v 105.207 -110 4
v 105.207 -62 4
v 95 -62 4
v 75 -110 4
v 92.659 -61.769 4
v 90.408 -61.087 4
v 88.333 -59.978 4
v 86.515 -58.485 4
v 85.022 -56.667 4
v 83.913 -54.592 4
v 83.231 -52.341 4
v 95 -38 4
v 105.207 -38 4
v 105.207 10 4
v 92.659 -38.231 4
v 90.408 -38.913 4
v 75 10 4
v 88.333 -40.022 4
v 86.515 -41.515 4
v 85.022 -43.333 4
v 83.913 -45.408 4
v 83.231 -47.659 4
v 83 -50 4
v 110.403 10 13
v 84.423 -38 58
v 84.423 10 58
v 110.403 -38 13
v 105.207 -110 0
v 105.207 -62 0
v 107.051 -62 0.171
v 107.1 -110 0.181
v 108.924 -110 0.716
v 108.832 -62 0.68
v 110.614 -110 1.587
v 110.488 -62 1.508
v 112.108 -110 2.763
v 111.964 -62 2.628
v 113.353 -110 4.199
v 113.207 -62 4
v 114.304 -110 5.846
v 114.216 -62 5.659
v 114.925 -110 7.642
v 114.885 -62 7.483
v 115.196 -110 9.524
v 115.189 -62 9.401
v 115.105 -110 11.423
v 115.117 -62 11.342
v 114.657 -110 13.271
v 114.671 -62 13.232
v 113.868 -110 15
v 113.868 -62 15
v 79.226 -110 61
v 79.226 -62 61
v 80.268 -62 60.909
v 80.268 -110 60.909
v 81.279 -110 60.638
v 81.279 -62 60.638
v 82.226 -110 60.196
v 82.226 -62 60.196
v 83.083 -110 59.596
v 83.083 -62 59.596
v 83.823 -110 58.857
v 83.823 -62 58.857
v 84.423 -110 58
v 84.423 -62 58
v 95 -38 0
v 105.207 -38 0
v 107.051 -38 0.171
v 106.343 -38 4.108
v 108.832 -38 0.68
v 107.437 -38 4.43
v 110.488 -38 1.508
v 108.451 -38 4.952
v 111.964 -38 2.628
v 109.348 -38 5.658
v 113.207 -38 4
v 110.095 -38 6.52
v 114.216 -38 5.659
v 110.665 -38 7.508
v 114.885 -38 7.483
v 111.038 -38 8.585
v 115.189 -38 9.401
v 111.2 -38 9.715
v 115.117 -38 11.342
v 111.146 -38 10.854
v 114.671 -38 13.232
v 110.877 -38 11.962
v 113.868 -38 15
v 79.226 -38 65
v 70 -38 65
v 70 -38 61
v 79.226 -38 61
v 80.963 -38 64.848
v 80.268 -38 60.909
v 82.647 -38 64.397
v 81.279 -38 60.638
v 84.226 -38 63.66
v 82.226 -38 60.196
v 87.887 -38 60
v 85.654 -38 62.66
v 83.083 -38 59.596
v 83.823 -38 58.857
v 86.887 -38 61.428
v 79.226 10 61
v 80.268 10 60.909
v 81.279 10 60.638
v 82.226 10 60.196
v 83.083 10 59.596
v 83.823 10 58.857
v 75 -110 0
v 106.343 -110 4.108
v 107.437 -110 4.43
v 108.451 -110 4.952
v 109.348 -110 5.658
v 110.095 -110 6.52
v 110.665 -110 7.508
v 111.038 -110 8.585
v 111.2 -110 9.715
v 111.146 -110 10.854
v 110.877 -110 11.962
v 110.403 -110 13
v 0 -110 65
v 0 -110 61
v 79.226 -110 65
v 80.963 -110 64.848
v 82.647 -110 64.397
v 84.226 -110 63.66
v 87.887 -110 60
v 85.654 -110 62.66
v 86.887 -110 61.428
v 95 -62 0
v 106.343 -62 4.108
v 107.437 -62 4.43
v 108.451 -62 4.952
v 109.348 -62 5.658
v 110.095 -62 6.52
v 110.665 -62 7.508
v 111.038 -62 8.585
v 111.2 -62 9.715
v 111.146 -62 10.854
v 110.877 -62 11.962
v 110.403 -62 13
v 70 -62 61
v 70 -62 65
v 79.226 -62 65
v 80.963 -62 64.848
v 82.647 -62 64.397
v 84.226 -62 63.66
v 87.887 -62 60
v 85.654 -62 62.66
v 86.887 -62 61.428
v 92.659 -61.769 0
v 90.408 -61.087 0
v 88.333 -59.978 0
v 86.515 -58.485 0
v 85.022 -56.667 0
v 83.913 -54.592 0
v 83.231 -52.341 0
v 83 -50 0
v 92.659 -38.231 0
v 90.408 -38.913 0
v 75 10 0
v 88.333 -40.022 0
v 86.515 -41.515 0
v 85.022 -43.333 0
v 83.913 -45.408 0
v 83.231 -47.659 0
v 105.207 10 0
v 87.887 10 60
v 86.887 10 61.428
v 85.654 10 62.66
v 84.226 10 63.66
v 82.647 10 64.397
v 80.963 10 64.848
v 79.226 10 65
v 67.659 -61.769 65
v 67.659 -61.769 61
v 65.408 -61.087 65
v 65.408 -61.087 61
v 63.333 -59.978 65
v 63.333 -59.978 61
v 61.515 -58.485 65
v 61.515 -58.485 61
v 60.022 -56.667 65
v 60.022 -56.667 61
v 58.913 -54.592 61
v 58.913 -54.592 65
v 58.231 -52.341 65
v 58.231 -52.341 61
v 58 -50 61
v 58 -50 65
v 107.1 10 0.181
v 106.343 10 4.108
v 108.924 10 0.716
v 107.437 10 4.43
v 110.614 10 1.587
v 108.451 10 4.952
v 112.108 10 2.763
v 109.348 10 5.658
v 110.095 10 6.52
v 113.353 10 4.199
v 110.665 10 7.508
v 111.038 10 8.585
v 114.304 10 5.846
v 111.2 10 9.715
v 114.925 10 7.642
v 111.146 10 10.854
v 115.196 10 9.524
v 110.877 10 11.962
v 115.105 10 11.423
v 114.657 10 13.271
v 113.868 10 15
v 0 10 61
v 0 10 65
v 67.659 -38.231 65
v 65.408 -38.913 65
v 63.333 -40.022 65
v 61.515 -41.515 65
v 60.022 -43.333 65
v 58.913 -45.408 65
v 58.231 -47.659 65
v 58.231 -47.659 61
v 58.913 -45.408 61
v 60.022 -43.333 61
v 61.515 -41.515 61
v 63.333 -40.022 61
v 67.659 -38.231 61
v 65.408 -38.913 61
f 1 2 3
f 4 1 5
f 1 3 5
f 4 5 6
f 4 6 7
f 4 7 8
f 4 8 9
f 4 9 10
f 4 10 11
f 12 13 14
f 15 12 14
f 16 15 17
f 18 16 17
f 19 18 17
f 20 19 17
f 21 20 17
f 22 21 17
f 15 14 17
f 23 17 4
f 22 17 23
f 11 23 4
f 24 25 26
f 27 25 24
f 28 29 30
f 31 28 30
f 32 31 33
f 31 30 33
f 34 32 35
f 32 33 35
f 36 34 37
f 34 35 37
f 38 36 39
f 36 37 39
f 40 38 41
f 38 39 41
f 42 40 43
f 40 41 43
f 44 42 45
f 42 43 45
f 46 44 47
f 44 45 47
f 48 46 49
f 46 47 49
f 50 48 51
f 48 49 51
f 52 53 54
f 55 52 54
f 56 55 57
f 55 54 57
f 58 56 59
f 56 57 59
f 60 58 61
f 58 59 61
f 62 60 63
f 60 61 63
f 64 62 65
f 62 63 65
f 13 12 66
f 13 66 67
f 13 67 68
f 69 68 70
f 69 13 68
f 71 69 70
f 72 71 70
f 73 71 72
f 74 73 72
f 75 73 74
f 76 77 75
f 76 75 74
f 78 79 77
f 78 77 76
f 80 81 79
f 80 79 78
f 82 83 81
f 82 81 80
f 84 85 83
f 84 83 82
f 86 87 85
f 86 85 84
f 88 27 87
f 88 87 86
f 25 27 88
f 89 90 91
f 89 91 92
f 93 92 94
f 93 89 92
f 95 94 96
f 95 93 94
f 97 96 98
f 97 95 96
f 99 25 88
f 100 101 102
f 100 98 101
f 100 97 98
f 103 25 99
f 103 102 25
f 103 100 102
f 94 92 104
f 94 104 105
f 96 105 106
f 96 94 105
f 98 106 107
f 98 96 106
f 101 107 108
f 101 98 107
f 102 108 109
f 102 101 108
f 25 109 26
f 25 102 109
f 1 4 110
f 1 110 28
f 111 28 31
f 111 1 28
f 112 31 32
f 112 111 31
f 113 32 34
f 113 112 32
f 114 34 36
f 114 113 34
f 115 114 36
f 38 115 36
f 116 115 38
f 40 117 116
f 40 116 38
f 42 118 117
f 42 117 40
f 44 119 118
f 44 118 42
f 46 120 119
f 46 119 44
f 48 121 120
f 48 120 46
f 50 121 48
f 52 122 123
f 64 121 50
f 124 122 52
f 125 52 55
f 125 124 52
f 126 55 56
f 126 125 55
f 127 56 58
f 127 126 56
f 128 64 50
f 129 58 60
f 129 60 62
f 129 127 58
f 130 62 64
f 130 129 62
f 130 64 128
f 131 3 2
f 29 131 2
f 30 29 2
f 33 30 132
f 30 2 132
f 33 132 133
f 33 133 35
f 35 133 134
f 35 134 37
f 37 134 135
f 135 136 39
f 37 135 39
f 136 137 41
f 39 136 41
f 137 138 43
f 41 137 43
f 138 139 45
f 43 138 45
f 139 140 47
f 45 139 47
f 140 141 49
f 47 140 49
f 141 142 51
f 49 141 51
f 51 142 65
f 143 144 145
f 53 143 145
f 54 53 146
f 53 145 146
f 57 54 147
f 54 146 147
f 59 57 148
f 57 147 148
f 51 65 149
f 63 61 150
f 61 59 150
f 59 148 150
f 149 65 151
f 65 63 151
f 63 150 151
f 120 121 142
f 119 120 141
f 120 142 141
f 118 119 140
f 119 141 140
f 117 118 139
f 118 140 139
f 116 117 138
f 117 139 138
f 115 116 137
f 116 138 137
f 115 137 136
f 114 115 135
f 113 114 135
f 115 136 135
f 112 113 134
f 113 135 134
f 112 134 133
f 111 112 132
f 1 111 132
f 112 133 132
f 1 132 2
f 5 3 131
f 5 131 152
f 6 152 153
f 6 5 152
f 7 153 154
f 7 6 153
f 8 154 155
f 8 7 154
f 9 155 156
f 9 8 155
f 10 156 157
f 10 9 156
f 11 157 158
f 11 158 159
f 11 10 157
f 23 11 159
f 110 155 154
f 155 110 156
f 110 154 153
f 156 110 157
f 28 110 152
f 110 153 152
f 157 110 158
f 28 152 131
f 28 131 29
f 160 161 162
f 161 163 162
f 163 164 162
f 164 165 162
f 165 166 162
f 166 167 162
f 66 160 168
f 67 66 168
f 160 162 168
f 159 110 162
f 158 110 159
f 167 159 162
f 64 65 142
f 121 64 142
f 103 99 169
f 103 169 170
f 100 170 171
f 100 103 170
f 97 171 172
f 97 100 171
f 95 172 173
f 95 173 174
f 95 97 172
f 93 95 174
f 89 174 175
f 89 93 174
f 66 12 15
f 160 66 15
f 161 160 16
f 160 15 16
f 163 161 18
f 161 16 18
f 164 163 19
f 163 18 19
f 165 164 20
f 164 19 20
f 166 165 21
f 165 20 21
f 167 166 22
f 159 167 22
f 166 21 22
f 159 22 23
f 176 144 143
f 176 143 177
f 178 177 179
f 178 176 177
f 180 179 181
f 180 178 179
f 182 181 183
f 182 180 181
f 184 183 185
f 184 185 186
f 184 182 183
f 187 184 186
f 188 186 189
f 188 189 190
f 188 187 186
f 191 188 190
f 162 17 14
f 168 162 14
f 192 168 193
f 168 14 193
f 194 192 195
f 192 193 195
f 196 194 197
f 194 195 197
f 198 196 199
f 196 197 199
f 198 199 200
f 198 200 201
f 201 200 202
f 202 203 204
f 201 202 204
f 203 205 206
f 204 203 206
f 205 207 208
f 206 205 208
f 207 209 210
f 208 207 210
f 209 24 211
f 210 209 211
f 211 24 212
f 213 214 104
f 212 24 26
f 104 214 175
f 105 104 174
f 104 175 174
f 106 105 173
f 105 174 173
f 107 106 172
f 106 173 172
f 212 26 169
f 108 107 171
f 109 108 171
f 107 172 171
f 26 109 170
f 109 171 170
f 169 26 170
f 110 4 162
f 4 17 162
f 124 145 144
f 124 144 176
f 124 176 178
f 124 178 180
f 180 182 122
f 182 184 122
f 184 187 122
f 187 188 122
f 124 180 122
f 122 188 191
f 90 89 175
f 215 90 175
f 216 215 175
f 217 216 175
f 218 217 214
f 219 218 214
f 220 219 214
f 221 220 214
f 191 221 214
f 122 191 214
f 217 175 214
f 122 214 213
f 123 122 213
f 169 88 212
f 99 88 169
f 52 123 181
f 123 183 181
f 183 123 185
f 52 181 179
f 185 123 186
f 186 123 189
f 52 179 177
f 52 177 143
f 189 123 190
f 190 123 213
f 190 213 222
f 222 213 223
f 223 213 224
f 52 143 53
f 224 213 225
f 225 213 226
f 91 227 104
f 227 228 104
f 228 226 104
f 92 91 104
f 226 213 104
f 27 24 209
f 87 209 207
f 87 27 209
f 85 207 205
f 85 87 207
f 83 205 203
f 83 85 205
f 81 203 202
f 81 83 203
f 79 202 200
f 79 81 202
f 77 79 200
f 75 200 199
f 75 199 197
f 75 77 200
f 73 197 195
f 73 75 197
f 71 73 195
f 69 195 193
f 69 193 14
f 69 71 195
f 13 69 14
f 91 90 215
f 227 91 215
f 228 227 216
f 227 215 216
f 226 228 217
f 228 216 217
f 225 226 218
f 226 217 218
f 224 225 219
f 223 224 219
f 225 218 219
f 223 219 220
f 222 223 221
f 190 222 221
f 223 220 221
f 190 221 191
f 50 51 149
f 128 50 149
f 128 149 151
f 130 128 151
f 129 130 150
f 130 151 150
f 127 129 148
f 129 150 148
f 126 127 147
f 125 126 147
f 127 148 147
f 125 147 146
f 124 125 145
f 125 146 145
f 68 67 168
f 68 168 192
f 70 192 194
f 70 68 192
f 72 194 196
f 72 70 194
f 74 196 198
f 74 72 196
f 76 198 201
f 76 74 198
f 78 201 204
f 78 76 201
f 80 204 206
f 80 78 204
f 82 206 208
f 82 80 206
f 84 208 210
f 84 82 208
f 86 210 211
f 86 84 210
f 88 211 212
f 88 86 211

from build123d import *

# Parameters (mm, degrees)
PAD_DEPTH       = 60
POCKET_DEPTH    = 61
POCKET001_DEPTH = 4.001


with BuildPart() as part:
    # Sketch001 → Pad (new body)
    with BuildSketch(Plane.XZ.offset(50)):
        with BuildLine():
            Line((0, 65), (0, 61))
            Line((0, 61), (79.226497, 61))
            ThreePointArc((79.226497, 61), (82.226497, 60.196152), (84.42265, 58))
            Line((84.42265, 58), (110.403412, 13))
            ThreePointArc((110.403412, 13), (110.403412, 7), (105.207259, 4))
            Line((105.207259, 4), (75, 4))
            Line((75, 4), (75, 0))
            Line((75, 0), (105.207259, 0))
            ThreePointArc((105.207259, 0), (113.867513, 5), (113.867513, 15))
            Line((113.867513, 15), (87.886751, 60))
            ThreePointArc((87.886751, 60), (84.226497, 63.660254), (79.226497, 65))
            Line((79.226497, 65), (0, 65))
        make_face()
    extrude(amount=-PAD_DEPTH)

    # Sketch002 (on Face12 of Pad) → Pocket (cut)
    with BuildSketch(Plane(origin=(0, -50, 65), x_dir=(-1, 0, 0), z_dir=(0, 0, 1))):
        with BuildLine():
            ThreePointArc((-70, -12), (-61.514719, -8.485281), (-58, 0))
            Line((-125.207259, 0), (-58, 0))
            Line((-125.207259, -12), (-125.207259, 0))
            Line((-70, -12), (-125.207259, -12))
        make_face()
    extrude(amount=-POCKET_DEPTH, mode=Mode.SUBTRACT)

    # Sketch003 (on Face17 of Pocket) → Pocket001 (cut, through all)
    with BuildSketch(Plane(origin=(0, -50, 4), x_dir=(-1, 0, 0), z_dir=(0, 0, 1))):
        with BuildLine():
            Line((-113.207259, 0), (-83, 0))
            ThreePointArc((-95, -12), (-86.514719, -8.485281), (-83, 0))
            Line((-95, -12), (-113.207259, -12))
            Line((-113.207259, -12), (-113.207259, 0))
        make_face()
    extrude(amount=-POCKET001_DEPTH, mode=Mode.SUBTRACT)

    # Mirrored: part across face of Pocket001


with BuildPart() as part_1:
    add(part.part)
    add(part.part.mirror(Plane(origin=(29, -50, 63), x_dir=(1, 0, 0), z_dir=(0, -1, 0))))


solid = part_1.part
